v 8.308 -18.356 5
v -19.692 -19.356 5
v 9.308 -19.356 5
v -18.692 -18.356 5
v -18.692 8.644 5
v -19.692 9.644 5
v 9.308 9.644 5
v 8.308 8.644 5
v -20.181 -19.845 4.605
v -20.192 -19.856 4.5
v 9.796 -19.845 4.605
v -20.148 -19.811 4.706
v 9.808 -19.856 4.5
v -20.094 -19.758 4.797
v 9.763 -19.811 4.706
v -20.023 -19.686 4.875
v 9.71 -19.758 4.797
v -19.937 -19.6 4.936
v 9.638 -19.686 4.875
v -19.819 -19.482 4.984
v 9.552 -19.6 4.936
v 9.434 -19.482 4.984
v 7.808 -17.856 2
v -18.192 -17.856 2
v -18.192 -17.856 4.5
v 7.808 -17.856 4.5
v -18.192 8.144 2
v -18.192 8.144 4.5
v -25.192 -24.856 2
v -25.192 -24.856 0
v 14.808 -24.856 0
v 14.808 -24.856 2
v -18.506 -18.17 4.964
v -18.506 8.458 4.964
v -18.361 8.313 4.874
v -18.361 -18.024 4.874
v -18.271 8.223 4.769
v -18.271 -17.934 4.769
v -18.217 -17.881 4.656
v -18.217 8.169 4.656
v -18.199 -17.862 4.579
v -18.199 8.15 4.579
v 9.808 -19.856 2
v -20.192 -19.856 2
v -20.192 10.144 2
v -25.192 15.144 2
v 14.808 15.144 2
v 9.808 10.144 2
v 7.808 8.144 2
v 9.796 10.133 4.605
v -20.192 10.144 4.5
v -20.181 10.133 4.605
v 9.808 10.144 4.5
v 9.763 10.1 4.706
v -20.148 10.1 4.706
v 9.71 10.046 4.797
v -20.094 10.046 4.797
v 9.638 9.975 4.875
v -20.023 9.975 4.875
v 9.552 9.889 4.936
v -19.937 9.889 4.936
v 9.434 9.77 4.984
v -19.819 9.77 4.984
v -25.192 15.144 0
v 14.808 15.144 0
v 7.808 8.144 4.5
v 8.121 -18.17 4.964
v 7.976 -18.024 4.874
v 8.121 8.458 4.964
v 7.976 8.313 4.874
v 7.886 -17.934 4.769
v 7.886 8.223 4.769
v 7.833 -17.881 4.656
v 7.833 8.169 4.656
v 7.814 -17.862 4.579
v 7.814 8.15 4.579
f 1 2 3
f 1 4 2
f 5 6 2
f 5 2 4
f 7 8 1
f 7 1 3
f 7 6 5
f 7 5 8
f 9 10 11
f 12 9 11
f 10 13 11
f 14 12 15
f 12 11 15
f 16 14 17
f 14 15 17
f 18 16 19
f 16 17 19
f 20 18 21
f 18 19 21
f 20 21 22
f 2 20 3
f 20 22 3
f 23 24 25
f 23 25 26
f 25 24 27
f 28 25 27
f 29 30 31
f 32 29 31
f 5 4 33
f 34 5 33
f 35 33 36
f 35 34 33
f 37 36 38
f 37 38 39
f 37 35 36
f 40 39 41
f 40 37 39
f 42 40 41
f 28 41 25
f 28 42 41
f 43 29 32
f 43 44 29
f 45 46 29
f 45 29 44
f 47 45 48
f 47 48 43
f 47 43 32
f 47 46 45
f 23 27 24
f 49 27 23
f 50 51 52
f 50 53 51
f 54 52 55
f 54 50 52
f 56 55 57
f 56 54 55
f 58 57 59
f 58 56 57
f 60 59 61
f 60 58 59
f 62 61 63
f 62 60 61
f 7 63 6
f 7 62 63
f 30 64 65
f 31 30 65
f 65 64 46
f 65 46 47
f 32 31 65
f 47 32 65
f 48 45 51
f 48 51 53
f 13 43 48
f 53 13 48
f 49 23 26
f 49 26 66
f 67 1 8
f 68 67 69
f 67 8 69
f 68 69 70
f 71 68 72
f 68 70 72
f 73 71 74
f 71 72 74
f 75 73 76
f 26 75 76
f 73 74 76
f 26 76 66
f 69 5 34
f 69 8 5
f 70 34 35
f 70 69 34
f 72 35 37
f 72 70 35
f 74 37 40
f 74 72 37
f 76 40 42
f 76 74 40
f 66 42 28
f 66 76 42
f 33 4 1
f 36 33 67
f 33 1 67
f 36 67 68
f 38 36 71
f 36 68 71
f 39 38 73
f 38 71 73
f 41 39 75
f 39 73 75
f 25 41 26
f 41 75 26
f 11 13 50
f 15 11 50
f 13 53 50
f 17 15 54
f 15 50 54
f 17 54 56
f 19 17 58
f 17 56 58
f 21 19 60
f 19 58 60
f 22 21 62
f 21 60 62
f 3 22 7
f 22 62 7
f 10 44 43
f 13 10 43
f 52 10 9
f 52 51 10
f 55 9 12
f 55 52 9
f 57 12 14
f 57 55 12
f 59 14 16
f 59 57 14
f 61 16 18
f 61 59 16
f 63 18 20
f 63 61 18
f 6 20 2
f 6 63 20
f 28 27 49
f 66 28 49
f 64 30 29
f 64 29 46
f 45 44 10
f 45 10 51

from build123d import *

# Parameters (mm, degrees)
SKETCH1_W           = 40
SKETCH1_H           = 40
BOSS_EXTRUDE1_DEPTH = 2
SKETCH2_W           = 30
SKETCH2_H           = 30
SKETCH2_W_2         = 26
SKETCH2_H_2         = 26
BOSS_EXTRUDE2_DEPTH = 3
FILLET1_R           = 0.5


with BuildPart() as part:
    # Sketch1 → Boss-Extrude1 (new body)
    with BuildSketch(Plane.XY):
        with Locations((-5.192307692, -4.855769231)):
            Rectangle(SKETCH1_W, SKETCH1_H)
    extrude(amount=BOSS_EXTRUDE1_DEPTH)

    # Sketch2 → Boss-Extrude2 (add)
    with BuildSketch(Plane.XY.offset(2)):
        with Locations((-5.192307692, -4.855769231)):
            Rectangle(SKETCH2_W, SKETCH2_H)
        with Locations((-5.192307692, -4.855769231)):
            Rectangle(SKETCH2_W_2, SKETCH2_H_2, mode=Mode.SUBTRACT)
    extrude(amount=BOSS_EXTRUDE2_DEPTH)

    # Fillet1
    fillet1_edges = [part.edges().sort_by_distance(p)[0] for p in [
        (-20.192307692, -4.855769231, 5),
        (-5.192307692, -19.855769231, 5),
        (9.807692308, -4.855769231, 5),
        (-5.192307692, 10.144230769, 5),
        (-18.192307692, -4.855769231, 5),
        (-5.192307692, -17.855769231, 5),
        (7.807692308, -4.855769231, 5),
        (-5.192307692, 8.144230769, 5),
    ]]
    fillet(fillet1_edges, radius=FILLET1_R)


solid = part.part
